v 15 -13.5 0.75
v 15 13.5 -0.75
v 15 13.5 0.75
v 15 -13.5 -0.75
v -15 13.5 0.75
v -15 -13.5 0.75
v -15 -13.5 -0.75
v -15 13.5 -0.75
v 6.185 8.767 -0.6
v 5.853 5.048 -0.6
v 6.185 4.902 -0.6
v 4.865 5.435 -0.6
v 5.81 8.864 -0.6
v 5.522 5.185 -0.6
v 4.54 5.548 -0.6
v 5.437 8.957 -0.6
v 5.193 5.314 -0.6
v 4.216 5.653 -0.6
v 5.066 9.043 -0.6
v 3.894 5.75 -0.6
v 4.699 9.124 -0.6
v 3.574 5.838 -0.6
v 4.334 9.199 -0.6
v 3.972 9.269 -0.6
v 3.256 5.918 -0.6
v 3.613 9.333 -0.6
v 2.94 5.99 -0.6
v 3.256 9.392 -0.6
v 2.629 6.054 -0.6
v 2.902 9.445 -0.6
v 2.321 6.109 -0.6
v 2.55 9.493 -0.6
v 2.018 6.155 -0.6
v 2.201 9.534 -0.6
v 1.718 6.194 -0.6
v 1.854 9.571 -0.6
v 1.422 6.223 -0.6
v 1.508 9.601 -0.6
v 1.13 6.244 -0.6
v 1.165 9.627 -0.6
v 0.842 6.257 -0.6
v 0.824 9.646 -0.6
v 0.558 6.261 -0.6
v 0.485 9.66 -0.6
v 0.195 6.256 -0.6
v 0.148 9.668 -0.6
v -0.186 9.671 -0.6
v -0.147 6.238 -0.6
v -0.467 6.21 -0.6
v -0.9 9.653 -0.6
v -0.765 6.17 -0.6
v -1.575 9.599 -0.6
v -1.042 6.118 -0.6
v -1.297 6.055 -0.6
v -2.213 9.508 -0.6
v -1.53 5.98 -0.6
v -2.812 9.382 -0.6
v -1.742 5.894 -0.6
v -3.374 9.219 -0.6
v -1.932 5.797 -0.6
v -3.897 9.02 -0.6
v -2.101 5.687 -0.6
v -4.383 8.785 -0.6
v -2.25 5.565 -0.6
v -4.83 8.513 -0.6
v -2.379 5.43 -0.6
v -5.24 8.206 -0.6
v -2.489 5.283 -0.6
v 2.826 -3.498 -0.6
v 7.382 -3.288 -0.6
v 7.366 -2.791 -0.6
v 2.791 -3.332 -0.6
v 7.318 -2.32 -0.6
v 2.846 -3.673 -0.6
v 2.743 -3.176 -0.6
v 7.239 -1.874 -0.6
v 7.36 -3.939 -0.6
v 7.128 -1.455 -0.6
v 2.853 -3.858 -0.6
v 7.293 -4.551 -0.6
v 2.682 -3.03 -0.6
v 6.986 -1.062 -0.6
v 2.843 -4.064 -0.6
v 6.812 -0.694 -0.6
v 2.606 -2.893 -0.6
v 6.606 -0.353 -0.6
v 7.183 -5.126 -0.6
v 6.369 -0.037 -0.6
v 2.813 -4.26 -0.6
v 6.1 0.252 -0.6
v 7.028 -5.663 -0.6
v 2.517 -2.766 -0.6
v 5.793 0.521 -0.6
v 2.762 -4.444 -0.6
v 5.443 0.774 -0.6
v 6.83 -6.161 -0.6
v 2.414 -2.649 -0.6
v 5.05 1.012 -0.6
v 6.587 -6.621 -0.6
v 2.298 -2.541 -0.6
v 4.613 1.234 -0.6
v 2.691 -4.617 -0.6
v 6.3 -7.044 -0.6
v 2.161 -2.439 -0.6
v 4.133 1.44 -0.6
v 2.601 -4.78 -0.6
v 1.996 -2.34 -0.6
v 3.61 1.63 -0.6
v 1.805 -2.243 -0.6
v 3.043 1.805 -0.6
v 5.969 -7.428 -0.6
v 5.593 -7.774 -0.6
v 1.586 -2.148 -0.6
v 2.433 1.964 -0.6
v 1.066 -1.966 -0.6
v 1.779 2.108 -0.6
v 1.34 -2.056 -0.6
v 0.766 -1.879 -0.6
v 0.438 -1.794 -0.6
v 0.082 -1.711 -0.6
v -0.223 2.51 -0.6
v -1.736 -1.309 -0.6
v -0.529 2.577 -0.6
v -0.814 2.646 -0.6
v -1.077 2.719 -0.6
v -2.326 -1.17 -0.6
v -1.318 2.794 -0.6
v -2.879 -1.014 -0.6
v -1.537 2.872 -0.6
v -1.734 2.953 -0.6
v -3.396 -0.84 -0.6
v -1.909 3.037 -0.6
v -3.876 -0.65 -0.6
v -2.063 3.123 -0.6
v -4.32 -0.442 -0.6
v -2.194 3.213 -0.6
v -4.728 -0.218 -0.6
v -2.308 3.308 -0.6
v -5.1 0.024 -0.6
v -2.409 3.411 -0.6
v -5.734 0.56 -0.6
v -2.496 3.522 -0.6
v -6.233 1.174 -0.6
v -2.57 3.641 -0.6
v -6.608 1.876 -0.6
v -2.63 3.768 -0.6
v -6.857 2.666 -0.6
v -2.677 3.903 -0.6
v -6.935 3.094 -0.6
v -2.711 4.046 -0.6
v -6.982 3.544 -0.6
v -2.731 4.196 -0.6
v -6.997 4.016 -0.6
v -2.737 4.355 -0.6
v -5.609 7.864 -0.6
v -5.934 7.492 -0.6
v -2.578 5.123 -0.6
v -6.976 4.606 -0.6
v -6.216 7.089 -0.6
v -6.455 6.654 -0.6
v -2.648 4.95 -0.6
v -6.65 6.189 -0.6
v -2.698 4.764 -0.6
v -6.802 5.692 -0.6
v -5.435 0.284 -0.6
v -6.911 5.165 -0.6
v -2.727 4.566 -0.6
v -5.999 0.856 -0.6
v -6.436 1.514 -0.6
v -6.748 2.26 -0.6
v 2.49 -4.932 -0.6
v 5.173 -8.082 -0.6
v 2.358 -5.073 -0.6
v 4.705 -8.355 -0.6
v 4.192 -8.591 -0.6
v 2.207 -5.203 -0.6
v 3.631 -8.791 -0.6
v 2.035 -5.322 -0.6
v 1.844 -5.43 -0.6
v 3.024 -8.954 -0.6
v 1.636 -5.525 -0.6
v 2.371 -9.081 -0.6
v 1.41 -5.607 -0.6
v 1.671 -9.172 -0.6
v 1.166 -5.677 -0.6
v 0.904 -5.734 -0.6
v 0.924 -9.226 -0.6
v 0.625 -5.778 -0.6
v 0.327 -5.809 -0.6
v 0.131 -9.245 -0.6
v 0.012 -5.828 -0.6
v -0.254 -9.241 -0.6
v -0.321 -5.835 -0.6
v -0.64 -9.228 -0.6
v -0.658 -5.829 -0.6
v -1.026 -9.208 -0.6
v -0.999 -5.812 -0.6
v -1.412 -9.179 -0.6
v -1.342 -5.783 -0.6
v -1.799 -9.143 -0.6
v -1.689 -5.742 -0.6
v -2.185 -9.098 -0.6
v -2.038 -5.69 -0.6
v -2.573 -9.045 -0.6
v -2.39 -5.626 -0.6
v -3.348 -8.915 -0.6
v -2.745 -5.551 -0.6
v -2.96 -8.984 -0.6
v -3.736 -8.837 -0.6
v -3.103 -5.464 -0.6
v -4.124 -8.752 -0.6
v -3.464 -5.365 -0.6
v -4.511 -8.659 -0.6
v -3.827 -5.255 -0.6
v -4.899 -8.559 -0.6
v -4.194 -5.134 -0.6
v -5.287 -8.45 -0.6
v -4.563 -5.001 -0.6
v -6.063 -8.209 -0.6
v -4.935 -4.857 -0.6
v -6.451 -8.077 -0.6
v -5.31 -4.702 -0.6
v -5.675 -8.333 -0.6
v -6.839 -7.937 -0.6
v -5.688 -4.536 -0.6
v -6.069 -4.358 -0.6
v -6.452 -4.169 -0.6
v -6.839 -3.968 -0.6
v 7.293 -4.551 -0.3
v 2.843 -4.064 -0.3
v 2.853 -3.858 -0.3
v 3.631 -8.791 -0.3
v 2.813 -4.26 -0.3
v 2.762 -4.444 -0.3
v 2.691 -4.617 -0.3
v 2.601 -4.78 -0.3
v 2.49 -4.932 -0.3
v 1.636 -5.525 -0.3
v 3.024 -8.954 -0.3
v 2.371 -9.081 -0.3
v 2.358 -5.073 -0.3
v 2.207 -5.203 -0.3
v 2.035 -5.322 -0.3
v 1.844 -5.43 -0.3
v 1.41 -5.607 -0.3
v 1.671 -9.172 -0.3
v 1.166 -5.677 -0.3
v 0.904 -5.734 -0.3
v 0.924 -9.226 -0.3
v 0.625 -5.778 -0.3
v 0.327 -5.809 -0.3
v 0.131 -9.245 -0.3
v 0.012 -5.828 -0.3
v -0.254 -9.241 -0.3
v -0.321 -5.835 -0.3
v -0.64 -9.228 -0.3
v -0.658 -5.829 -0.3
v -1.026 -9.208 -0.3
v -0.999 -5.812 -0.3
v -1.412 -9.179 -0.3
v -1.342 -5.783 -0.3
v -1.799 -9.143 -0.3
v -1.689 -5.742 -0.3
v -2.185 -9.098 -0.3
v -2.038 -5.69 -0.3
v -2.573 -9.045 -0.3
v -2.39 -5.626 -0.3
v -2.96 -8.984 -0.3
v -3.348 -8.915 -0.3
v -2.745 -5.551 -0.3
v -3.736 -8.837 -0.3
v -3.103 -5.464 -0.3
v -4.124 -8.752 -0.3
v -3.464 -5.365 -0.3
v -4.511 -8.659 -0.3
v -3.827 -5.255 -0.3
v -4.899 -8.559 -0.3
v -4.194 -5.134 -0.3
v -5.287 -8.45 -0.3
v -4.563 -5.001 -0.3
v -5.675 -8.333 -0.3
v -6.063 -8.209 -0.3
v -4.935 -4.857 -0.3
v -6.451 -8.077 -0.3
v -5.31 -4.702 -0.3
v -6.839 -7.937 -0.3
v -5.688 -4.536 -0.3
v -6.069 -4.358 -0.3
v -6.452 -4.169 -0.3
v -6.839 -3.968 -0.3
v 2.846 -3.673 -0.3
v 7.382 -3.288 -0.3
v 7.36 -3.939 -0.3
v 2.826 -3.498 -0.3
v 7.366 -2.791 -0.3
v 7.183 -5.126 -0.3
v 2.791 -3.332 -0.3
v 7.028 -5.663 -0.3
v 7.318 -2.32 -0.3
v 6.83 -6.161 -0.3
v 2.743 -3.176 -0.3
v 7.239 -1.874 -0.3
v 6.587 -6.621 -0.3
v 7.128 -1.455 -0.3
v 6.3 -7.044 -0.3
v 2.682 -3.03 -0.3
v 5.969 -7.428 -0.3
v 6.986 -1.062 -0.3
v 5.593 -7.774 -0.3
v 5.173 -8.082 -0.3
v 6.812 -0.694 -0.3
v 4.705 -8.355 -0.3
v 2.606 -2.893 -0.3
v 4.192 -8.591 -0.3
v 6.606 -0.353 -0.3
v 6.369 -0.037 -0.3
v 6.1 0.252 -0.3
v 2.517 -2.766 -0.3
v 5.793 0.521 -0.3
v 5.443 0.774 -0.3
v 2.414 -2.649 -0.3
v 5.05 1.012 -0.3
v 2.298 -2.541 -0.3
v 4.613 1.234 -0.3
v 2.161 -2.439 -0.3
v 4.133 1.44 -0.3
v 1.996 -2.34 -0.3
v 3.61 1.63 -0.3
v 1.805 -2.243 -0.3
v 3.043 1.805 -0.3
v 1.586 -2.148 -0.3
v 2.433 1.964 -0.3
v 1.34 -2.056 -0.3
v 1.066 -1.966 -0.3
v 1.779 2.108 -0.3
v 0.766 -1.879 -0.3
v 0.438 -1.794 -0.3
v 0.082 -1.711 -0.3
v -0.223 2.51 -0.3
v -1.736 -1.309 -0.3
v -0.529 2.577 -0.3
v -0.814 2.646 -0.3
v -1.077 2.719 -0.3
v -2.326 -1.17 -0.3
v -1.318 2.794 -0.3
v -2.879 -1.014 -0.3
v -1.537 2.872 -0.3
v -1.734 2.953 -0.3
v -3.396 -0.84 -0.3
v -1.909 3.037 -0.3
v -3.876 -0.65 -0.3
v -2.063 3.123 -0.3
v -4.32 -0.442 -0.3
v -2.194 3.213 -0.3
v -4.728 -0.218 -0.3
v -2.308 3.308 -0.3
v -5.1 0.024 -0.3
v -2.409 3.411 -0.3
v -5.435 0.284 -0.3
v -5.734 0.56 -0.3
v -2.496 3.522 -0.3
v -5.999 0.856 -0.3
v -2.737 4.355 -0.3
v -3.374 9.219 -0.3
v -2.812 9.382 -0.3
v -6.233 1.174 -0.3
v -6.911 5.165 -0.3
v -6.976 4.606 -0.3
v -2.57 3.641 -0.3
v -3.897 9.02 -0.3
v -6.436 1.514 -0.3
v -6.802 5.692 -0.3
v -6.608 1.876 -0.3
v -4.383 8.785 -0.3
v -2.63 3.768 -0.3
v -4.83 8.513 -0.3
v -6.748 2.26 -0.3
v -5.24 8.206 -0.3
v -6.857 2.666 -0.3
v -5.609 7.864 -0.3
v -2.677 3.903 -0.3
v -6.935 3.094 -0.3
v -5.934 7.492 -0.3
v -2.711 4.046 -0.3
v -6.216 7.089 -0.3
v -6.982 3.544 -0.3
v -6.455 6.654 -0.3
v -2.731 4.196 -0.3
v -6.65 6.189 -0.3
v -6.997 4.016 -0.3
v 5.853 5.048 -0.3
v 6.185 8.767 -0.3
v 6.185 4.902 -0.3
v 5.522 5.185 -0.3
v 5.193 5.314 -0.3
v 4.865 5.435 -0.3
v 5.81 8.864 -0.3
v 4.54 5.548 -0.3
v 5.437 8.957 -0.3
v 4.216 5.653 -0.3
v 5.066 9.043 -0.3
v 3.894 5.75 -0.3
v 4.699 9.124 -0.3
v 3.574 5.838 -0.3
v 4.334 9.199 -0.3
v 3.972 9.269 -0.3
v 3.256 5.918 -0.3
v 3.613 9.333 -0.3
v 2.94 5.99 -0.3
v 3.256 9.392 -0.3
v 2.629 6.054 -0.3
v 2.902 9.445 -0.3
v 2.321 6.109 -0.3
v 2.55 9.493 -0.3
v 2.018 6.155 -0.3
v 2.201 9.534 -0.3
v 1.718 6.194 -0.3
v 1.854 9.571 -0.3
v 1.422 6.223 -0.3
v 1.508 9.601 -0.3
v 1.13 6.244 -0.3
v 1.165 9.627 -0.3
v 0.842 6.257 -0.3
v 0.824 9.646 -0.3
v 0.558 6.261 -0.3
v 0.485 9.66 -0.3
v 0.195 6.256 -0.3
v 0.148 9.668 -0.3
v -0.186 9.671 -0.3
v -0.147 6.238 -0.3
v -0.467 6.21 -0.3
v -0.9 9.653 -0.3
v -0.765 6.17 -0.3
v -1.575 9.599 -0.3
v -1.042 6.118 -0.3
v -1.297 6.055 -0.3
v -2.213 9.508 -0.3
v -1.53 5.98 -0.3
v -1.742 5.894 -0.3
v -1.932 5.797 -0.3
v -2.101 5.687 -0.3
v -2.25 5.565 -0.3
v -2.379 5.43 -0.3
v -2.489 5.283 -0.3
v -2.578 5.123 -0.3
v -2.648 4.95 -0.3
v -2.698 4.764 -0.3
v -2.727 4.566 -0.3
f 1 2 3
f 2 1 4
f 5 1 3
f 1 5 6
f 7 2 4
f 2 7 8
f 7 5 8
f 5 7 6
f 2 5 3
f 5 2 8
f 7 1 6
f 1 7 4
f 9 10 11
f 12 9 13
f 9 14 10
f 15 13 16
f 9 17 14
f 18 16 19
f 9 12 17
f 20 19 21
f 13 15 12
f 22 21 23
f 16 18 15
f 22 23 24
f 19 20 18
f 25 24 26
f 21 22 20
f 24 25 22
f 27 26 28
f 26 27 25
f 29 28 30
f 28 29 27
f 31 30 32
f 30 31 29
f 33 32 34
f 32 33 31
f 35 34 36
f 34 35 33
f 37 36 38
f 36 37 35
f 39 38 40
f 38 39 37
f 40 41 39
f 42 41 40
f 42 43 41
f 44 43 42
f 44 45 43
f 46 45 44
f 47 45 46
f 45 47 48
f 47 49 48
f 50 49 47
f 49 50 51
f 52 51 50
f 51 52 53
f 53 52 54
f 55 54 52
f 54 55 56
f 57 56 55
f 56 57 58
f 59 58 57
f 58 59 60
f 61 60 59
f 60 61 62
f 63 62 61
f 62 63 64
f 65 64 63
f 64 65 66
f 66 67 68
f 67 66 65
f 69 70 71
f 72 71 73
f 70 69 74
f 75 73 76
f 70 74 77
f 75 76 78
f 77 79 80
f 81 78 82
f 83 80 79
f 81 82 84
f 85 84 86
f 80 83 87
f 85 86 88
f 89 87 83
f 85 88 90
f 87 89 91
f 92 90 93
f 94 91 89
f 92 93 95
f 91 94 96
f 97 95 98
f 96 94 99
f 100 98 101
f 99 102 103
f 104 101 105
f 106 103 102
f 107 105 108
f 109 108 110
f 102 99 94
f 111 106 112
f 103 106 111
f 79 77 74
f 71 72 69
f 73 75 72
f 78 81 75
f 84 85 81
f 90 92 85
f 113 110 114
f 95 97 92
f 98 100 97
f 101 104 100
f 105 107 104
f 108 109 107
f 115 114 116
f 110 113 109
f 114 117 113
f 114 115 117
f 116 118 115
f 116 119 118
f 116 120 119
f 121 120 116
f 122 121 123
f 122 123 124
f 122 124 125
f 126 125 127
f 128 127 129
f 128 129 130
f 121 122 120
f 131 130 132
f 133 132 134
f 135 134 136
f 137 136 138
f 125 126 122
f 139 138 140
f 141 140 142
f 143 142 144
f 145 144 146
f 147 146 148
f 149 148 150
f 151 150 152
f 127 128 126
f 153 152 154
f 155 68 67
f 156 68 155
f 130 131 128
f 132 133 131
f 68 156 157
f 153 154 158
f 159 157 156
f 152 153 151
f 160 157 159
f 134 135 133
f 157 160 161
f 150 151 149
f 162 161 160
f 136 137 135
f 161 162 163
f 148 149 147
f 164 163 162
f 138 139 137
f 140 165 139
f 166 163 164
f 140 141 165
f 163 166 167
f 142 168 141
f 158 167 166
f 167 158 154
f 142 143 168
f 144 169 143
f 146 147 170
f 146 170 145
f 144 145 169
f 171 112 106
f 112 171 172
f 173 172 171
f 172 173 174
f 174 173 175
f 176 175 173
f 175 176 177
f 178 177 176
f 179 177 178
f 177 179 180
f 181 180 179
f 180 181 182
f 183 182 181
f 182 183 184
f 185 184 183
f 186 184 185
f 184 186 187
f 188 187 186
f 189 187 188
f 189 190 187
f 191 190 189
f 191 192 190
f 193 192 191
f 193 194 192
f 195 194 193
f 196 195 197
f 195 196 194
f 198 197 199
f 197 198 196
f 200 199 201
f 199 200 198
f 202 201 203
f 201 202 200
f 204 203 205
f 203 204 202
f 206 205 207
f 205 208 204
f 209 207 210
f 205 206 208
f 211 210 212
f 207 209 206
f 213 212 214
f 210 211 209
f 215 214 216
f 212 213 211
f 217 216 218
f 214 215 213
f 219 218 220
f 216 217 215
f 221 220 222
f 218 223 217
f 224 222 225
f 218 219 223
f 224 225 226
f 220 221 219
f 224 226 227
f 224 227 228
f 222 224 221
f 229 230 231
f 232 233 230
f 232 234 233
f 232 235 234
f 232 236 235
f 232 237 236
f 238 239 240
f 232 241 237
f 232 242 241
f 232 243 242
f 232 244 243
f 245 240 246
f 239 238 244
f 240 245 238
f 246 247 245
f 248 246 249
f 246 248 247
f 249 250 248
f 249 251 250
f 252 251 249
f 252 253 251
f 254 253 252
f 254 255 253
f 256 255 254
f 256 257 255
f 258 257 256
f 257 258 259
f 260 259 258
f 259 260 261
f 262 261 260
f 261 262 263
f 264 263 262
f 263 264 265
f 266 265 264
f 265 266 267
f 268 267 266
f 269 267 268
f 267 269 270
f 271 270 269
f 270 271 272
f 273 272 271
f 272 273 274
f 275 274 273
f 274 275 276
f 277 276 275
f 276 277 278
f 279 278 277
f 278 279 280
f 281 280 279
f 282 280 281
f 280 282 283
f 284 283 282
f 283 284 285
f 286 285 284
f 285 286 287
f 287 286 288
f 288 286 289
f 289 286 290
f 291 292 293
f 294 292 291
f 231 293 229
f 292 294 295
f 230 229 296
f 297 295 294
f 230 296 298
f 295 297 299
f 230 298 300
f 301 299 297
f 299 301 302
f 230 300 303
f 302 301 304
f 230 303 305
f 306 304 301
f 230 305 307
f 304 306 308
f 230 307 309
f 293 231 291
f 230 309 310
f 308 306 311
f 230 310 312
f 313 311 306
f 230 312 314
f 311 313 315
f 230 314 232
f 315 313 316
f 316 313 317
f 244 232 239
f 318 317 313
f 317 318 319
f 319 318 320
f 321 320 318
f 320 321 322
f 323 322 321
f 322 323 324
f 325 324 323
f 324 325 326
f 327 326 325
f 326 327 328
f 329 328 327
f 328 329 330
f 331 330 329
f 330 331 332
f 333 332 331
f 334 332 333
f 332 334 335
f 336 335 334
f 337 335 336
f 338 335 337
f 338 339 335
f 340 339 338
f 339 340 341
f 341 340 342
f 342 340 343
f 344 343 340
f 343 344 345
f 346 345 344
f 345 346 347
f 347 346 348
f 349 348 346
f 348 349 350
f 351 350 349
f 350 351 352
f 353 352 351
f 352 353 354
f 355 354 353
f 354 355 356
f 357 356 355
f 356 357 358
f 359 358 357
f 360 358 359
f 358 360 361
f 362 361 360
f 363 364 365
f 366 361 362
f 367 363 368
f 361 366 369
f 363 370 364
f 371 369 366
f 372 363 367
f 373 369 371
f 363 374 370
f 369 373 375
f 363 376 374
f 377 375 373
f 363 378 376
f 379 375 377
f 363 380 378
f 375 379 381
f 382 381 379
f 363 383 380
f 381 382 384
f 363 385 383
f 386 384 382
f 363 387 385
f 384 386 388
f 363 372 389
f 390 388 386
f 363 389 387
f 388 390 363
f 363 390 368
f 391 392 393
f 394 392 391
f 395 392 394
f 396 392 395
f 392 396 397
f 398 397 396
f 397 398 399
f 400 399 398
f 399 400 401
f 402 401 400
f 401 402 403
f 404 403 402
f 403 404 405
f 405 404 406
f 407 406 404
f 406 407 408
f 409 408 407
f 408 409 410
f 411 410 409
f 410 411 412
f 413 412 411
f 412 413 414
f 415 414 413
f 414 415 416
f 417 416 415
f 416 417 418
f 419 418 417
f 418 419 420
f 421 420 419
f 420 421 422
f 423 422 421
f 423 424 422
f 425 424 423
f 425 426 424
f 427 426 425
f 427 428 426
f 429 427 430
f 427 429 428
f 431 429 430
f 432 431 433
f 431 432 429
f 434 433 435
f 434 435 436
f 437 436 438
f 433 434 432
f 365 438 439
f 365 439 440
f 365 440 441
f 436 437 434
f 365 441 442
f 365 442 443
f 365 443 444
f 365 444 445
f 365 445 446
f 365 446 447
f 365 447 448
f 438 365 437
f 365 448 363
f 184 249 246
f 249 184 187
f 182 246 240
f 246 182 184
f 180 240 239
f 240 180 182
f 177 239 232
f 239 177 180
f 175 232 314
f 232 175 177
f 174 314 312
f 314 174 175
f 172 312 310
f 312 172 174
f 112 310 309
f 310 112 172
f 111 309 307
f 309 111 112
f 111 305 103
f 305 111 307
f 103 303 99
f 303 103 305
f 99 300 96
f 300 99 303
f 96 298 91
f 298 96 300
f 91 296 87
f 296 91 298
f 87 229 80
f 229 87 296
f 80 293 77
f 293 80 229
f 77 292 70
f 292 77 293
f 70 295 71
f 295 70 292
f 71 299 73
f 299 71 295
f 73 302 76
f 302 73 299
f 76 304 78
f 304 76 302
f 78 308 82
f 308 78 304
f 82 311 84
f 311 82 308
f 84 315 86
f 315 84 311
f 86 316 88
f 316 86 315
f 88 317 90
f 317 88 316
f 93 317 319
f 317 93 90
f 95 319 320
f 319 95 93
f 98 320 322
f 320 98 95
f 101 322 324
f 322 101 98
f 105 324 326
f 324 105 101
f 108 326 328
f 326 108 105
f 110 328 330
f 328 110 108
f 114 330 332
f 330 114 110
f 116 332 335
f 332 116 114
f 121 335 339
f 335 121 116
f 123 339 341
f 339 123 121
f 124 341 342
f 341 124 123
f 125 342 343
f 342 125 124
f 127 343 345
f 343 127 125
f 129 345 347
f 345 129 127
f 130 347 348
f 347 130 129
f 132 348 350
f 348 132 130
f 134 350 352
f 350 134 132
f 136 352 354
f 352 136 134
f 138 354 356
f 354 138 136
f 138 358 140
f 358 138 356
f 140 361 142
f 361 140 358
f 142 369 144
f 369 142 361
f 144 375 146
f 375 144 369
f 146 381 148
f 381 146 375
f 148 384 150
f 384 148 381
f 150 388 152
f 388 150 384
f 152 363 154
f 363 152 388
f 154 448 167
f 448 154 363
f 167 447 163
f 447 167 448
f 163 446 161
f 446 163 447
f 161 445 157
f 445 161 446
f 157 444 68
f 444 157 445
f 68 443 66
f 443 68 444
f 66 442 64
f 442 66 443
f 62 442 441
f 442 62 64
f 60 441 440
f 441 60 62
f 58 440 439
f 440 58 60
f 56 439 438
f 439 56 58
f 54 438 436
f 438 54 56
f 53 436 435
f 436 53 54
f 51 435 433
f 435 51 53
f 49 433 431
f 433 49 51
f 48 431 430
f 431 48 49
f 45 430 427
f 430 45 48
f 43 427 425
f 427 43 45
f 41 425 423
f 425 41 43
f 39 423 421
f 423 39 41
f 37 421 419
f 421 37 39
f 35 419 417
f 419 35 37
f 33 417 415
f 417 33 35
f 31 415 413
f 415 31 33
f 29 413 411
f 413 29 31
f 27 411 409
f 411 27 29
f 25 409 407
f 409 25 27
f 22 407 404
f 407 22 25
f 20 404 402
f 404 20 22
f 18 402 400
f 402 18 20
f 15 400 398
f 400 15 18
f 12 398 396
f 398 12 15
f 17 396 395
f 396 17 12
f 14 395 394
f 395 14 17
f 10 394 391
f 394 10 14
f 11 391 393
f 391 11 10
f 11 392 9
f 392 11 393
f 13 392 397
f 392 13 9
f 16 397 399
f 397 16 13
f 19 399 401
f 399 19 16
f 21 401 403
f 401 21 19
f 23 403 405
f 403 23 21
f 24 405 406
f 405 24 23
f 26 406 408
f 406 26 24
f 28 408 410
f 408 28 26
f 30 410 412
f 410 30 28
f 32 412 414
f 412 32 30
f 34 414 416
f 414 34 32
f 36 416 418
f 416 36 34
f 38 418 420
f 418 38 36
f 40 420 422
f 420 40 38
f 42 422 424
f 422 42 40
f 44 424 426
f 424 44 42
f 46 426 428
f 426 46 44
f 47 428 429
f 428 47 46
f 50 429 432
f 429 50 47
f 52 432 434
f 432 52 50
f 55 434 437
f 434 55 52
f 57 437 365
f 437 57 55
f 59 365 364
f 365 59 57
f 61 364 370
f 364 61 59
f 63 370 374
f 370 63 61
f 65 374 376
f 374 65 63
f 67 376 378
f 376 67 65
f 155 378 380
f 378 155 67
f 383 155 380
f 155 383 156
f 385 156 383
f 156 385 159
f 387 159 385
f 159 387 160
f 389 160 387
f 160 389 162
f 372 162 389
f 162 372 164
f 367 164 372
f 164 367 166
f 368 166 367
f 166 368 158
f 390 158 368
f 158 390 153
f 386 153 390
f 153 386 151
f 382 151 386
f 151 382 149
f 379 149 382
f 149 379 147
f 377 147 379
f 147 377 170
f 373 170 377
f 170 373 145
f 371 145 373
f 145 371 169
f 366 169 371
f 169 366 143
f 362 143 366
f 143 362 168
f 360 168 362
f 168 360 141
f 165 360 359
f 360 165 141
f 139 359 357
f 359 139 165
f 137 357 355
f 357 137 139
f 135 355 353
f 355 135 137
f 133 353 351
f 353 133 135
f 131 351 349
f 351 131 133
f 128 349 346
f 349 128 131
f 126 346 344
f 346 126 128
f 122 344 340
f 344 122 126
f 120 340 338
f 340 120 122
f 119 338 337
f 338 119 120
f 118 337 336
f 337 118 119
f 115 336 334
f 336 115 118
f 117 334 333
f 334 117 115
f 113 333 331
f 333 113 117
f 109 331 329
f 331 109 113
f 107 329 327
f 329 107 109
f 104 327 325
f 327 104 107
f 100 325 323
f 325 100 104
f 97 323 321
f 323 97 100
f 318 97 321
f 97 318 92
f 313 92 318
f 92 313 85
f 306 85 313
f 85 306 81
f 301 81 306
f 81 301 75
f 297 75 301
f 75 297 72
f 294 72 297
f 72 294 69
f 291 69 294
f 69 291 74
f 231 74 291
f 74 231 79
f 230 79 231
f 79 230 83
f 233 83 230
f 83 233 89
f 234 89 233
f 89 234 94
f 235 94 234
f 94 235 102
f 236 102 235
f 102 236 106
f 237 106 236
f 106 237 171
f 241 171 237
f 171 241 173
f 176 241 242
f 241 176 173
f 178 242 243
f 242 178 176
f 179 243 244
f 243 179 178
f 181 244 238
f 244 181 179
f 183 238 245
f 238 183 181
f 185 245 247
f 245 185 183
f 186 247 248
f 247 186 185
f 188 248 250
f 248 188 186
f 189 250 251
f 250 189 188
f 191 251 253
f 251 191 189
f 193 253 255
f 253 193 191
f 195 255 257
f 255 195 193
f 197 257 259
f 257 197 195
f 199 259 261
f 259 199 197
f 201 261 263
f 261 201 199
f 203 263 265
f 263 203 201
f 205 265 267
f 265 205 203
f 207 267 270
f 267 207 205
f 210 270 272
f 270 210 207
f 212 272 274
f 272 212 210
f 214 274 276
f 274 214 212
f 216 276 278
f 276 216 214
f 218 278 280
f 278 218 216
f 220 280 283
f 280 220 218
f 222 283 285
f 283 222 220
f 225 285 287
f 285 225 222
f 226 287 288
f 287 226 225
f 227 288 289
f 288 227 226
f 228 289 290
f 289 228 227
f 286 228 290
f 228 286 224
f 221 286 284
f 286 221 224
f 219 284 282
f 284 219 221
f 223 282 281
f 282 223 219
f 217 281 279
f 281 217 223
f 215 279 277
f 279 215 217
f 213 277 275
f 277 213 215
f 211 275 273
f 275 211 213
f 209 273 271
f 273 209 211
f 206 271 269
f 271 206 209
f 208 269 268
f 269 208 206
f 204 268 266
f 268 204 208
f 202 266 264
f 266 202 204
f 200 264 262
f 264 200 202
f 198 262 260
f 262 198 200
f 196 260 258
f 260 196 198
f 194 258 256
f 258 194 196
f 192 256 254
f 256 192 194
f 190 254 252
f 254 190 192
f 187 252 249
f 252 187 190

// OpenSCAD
$fn=96;
height=2;
extension_width=27;
width=30;
depth=27;
side_width=101.5;


left_x=-width/2-extension_width/2;
left_y=0;
left_z=0;

font = "DejaVu Sans:style=Bold";
letter_size = 18;
topstring = "S";
bottomstring = "Veteran";

module topbanner() {
    difference() {
      union() {
        cube(size=[width, depth, 1.5], center = true);
        //translate([-105, -10, -1.5]) cube(size=[width/5, depth-7, height-3]);
        //translate([63.5, -10, -1.5]) cube(size=[width/5, depth-7, height-3]);
        
      }
      translate([0, 0, -.6 ])  
      linear_extrude(.3) {
          text(topstring, size = letter_size, font = font, halign = "center", valign = "center", $fn = 64);
      
    }
  }
}

topbanner();
